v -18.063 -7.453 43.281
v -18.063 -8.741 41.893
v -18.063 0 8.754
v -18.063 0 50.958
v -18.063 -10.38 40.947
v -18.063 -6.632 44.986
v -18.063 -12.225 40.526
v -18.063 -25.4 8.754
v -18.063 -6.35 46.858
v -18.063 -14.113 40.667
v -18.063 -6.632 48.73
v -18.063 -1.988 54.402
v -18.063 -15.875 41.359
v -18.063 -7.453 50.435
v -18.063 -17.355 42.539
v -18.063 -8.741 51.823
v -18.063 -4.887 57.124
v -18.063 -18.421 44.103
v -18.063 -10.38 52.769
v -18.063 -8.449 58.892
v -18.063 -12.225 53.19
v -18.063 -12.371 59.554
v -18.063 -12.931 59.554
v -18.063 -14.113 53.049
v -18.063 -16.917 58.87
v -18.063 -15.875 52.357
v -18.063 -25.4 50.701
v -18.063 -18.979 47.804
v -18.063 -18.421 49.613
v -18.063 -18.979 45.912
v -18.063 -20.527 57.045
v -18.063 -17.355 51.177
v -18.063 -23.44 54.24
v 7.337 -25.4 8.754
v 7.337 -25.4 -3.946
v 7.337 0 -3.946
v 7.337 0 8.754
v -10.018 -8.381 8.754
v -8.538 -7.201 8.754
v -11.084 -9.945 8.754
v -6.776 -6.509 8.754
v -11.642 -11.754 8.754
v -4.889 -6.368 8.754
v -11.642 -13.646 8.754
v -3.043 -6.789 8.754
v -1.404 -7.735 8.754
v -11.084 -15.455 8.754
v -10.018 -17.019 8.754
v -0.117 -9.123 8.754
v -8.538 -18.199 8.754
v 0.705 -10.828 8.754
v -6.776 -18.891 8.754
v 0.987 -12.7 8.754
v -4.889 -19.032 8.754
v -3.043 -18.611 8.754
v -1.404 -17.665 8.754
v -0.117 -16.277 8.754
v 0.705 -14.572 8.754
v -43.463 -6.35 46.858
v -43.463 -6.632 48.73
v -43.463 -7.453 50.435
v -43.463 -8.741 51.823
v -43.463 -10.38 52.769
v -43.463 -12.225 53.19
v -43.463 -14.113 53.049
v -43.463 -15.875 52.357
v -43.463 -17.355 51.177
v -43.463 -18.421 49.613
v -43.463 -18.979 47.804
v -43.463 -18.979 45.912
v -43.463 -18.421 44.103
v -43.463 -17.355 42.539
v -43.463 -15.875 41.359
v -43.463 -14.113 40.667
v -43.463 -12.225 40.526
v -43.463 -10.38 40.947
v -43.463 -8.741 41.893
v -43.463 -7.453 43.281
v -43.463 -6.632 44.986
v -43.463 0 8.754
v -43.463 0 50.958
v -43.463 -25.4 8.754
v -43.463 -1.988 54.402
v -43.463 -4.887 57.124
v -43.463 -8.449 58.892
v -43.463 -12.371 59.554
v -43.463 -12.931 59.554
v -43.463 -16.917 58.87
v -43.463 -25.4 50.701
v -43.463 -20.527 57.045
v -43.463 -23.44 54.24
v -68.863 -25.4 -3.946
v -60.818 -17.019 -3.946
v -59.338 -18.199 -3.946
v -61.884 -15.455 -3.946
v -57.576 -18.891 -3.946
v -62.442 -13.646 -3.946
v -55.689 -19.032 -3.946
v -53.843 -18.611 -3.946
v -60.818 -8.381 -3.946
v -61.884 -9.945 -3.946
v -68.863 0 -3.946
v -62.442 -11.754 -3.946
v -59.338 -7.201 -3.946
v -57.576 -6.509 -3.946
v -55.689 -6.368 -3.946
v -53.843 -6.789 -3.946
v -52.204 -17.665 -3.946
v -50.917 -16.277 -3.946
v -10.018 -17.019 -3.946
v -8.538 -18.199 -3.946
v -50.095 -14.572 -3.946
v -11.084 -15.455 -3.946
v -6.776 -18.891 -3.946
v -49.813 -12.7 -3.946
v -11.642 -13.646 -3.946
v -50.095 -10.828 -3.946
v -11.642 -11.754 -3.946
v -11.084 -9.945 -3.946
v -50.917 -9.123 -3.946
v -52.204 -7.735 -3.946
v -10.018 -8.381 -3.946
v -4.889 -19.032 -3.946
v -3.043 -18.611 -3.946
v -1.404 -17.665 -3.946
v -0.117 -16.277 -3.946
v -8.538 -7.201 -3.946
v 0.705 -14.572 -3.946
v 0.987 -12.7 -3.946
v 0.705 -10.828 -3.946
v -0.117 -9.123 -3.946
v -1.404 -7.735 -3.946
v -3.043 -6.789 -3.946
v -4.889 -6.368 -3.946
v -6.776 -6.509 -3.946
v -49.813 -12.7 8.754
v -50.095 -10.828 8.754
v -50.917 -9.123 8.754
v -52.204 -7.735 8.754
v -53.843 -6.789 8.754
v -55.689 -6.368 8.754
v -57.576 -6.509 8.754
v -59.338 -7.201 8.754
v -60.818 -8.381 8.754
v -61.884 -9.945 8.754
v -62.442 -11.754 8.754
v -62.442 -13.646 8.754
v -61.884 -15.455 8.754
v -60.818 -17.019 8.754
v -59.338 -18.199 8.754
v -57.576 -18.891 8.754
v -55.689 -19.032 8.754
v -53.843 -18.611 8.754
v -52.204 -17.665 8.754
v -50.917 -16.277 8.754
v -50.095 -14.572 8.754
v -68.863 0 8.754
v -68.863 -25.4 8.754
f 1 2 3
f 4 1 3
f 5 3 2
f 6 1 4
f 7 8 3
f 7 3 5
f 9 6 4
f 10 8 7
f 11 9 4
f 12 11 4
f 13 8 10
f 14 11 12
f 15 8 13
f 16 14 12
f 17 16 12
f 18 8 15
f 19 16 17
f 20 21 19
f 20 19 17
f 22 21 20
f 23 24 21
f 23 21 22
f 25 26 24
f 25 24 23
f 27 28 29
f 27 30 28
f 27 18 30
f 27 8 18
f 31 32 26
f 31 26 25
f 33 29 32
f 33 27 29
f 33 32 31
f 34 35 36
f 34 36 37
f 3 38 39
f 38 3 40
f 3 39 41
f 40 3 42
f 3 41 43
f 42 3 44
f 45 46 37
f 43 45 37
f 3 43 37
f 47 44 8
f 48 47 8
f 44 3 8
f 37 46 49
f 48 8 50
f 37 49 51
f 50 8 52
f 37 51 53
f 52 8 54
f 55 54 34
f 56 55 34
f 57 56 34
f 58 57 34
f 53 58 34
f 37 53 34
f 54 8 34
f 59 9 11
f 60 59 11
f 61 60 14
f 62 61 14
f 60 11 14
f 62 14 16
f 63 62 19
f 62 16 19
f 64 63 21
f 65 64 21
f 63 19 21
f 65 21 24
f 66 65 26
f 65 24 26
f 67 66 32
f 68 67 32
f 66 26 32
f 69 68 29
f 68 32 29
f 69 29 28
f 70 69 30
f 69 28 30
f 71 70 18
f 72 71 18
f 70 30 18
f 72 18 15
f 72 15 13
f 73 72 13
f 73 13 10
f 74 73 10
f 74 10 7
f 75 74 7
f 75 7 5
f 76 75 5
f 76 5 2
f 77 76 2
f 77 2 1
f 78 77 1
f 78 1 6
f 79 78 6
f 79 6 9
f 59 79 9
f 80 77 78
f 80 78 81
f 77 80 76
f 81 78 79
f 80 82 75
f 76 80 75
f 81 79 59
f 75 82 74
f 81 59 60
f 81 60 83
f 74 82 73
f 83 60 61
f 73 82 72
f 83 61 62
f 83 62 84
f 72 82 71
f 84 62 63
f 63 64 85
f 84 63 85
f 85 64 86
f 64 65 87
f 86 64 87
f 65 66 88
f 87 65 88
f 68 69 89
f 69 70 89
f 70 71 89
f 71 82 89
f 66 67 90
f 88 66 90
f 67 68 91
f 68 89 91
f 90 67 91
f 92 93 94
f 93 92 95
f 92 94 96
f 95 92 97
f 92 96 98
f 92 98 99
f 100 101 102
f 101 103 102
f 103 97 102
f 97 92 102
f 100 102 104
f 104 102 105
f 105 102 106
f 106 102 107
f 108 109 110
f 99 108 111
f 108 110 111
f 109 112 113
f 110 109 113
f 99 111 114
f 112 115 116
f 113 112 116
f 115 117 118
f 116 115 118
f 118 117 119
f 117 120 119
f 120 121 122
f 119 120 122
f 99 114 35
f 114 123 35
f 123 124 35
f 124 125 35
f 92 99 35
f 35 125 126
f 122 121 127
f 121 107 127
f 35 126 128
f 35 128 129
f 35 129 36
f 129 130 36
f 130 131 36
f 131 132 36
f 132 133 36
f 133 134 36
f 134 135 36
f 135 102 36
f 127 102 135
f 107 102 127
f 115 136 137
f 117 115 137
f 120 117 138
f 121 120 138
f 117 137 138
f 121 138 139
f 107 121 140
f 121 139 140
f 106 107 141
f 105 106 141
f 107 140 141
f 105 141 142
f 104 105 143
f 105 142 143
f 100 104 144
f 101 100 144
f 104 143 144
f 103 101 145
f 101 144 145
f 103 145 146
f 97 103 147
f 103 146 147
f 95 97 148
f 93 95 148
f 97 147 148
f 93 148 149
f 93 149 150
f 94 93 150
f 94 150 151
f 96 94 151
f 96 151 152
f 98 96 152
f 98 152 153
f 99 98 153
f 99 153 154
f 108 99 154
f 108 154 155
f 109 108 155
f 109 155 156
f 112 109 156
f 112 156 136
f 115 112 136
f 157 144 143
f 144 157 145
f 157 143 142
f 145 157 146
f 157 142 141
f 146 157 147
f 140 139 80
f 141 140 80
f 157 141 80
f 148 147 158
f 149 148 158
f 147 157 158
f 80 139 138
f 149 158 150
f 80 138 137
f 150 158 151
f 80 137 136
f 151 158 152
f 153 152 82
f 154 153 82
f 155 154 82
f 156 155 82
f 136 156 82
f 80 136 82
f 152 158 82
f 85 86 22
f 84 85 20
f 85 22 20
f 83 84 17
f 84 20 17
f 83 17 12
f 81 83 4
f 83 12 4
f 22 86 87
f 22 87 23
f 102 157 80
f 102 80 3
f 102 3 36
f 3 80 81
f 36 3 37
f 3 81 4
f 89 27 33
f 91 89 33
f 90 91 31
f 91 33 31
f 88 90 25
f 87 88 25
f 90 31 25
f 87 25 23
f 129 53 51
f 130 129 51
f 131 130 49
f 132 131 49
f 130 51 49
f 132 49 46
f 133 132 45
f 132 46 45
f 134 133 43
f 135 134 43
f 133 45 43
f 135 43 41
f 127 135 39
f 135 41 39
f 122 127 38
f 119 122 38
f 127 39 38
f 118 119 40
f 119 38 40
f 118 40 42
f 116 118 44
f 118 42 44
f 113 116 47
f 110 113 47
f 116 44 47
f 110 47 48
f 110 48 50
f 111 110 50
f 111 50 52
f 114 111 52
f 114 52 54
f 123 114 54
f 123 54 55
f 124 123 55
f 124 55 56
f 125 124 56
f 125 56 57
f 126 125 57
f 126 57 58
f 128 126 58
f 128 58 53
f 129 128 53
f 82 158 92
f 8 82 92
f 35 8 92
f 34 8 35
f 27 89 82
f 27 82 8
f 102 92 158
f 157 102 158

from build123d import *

# Parameters (mm, degrees)
F0_W      = 76.2
F0_H      = 63.5
F1_DEPTH  = 25.4
F2_W      = 25.4
F2_H      = 50.8
F3_DEPTH  = 25.401
F7_DEPTH  = 25.4
F5_R      = 6.35
F4_R      = 6.35
F8_DEPTH  = 25.4
F9_R      = 6.35
F10_DEPTH = 50.801


with BuildPart() as f1:
    # F0 (on Front) → F1 (new body)
    with BuildSketch(Plane.XZ):
        with Locations((-30.763134826, 27.8038036936)):
            Rectangle(F0_W, F0_H)
    extrude(amount=F1_DEPTH)

    # F2 (on face) → F3 (cut, through all)
    with BuildSketch(Plane.XZ.offset(25.4)):
        with Locations((-56.163134826, 34.1538036936)):
            Rectangle(F2_W, F2_H)
        with Locations((-5.363134826, 34.1538036936)):
            Rectangle(F2_W, F2_H)
    extrude(amount=-F3_DEPTH, mode=Mode.SUBTRACT)

    # F6 (on face) → F7 (cut)
    with BuildSketch(Plane.YZ.offset(-18.063134826)):
        with BuildLine():
            ThreePointArc((-25.4, 50.7014505565), (-20.5266979075, 57.0452252376), (-12.9306736435, 59.5538036936))
            Line((-12.9306736435, 59.5538036936), (-25.4, 59.5538036936))
            Line((-25.4, 59.5538036936), (-25.4, 50.7014505565))
        make_face()
        with BuildLine():
            ThreePointArc((-12.3705876013, 59.5538036936), (-4.8872224378, 57.1243511626), (0, 50.9584732354))
            Line((0, 50.9584732354), (0, 59.5538036936))
            Line((0, 59.5538036936), (-12.3705876013, 59.5538036936))
        make_face()
    extrude(amount=-F7_DEPTH, mode=Mode.SUBTRACT)

    # F5 (on face) + F4 (on face) → F8 (cut)
    with BuildSketch(Plane.XY.offset(8.7538036936)):
        with Locations((-5.363134826, -12.7)):
            Circle(F5_R)
    with BuildSketch(Plane.XY.offset(8.7538036936)):
        with Locations((-56.163134826, -12.7)):
            Circle(F4_R)
    extrude(amount=-F8_DEPTH, mode=Mode.SUBTRACT)

    # F9 (on face) → F10 (cut, through all)
    with BuildSketch(Plane.YZ.offset(-18.063134826)):
        with Locations((-12.7, 46.8580765592)):
            Circle(F9_R)
    extrude(amount=-F10_DEPTH, mode=Mode.SUBTRACT)


solid = f1.part
